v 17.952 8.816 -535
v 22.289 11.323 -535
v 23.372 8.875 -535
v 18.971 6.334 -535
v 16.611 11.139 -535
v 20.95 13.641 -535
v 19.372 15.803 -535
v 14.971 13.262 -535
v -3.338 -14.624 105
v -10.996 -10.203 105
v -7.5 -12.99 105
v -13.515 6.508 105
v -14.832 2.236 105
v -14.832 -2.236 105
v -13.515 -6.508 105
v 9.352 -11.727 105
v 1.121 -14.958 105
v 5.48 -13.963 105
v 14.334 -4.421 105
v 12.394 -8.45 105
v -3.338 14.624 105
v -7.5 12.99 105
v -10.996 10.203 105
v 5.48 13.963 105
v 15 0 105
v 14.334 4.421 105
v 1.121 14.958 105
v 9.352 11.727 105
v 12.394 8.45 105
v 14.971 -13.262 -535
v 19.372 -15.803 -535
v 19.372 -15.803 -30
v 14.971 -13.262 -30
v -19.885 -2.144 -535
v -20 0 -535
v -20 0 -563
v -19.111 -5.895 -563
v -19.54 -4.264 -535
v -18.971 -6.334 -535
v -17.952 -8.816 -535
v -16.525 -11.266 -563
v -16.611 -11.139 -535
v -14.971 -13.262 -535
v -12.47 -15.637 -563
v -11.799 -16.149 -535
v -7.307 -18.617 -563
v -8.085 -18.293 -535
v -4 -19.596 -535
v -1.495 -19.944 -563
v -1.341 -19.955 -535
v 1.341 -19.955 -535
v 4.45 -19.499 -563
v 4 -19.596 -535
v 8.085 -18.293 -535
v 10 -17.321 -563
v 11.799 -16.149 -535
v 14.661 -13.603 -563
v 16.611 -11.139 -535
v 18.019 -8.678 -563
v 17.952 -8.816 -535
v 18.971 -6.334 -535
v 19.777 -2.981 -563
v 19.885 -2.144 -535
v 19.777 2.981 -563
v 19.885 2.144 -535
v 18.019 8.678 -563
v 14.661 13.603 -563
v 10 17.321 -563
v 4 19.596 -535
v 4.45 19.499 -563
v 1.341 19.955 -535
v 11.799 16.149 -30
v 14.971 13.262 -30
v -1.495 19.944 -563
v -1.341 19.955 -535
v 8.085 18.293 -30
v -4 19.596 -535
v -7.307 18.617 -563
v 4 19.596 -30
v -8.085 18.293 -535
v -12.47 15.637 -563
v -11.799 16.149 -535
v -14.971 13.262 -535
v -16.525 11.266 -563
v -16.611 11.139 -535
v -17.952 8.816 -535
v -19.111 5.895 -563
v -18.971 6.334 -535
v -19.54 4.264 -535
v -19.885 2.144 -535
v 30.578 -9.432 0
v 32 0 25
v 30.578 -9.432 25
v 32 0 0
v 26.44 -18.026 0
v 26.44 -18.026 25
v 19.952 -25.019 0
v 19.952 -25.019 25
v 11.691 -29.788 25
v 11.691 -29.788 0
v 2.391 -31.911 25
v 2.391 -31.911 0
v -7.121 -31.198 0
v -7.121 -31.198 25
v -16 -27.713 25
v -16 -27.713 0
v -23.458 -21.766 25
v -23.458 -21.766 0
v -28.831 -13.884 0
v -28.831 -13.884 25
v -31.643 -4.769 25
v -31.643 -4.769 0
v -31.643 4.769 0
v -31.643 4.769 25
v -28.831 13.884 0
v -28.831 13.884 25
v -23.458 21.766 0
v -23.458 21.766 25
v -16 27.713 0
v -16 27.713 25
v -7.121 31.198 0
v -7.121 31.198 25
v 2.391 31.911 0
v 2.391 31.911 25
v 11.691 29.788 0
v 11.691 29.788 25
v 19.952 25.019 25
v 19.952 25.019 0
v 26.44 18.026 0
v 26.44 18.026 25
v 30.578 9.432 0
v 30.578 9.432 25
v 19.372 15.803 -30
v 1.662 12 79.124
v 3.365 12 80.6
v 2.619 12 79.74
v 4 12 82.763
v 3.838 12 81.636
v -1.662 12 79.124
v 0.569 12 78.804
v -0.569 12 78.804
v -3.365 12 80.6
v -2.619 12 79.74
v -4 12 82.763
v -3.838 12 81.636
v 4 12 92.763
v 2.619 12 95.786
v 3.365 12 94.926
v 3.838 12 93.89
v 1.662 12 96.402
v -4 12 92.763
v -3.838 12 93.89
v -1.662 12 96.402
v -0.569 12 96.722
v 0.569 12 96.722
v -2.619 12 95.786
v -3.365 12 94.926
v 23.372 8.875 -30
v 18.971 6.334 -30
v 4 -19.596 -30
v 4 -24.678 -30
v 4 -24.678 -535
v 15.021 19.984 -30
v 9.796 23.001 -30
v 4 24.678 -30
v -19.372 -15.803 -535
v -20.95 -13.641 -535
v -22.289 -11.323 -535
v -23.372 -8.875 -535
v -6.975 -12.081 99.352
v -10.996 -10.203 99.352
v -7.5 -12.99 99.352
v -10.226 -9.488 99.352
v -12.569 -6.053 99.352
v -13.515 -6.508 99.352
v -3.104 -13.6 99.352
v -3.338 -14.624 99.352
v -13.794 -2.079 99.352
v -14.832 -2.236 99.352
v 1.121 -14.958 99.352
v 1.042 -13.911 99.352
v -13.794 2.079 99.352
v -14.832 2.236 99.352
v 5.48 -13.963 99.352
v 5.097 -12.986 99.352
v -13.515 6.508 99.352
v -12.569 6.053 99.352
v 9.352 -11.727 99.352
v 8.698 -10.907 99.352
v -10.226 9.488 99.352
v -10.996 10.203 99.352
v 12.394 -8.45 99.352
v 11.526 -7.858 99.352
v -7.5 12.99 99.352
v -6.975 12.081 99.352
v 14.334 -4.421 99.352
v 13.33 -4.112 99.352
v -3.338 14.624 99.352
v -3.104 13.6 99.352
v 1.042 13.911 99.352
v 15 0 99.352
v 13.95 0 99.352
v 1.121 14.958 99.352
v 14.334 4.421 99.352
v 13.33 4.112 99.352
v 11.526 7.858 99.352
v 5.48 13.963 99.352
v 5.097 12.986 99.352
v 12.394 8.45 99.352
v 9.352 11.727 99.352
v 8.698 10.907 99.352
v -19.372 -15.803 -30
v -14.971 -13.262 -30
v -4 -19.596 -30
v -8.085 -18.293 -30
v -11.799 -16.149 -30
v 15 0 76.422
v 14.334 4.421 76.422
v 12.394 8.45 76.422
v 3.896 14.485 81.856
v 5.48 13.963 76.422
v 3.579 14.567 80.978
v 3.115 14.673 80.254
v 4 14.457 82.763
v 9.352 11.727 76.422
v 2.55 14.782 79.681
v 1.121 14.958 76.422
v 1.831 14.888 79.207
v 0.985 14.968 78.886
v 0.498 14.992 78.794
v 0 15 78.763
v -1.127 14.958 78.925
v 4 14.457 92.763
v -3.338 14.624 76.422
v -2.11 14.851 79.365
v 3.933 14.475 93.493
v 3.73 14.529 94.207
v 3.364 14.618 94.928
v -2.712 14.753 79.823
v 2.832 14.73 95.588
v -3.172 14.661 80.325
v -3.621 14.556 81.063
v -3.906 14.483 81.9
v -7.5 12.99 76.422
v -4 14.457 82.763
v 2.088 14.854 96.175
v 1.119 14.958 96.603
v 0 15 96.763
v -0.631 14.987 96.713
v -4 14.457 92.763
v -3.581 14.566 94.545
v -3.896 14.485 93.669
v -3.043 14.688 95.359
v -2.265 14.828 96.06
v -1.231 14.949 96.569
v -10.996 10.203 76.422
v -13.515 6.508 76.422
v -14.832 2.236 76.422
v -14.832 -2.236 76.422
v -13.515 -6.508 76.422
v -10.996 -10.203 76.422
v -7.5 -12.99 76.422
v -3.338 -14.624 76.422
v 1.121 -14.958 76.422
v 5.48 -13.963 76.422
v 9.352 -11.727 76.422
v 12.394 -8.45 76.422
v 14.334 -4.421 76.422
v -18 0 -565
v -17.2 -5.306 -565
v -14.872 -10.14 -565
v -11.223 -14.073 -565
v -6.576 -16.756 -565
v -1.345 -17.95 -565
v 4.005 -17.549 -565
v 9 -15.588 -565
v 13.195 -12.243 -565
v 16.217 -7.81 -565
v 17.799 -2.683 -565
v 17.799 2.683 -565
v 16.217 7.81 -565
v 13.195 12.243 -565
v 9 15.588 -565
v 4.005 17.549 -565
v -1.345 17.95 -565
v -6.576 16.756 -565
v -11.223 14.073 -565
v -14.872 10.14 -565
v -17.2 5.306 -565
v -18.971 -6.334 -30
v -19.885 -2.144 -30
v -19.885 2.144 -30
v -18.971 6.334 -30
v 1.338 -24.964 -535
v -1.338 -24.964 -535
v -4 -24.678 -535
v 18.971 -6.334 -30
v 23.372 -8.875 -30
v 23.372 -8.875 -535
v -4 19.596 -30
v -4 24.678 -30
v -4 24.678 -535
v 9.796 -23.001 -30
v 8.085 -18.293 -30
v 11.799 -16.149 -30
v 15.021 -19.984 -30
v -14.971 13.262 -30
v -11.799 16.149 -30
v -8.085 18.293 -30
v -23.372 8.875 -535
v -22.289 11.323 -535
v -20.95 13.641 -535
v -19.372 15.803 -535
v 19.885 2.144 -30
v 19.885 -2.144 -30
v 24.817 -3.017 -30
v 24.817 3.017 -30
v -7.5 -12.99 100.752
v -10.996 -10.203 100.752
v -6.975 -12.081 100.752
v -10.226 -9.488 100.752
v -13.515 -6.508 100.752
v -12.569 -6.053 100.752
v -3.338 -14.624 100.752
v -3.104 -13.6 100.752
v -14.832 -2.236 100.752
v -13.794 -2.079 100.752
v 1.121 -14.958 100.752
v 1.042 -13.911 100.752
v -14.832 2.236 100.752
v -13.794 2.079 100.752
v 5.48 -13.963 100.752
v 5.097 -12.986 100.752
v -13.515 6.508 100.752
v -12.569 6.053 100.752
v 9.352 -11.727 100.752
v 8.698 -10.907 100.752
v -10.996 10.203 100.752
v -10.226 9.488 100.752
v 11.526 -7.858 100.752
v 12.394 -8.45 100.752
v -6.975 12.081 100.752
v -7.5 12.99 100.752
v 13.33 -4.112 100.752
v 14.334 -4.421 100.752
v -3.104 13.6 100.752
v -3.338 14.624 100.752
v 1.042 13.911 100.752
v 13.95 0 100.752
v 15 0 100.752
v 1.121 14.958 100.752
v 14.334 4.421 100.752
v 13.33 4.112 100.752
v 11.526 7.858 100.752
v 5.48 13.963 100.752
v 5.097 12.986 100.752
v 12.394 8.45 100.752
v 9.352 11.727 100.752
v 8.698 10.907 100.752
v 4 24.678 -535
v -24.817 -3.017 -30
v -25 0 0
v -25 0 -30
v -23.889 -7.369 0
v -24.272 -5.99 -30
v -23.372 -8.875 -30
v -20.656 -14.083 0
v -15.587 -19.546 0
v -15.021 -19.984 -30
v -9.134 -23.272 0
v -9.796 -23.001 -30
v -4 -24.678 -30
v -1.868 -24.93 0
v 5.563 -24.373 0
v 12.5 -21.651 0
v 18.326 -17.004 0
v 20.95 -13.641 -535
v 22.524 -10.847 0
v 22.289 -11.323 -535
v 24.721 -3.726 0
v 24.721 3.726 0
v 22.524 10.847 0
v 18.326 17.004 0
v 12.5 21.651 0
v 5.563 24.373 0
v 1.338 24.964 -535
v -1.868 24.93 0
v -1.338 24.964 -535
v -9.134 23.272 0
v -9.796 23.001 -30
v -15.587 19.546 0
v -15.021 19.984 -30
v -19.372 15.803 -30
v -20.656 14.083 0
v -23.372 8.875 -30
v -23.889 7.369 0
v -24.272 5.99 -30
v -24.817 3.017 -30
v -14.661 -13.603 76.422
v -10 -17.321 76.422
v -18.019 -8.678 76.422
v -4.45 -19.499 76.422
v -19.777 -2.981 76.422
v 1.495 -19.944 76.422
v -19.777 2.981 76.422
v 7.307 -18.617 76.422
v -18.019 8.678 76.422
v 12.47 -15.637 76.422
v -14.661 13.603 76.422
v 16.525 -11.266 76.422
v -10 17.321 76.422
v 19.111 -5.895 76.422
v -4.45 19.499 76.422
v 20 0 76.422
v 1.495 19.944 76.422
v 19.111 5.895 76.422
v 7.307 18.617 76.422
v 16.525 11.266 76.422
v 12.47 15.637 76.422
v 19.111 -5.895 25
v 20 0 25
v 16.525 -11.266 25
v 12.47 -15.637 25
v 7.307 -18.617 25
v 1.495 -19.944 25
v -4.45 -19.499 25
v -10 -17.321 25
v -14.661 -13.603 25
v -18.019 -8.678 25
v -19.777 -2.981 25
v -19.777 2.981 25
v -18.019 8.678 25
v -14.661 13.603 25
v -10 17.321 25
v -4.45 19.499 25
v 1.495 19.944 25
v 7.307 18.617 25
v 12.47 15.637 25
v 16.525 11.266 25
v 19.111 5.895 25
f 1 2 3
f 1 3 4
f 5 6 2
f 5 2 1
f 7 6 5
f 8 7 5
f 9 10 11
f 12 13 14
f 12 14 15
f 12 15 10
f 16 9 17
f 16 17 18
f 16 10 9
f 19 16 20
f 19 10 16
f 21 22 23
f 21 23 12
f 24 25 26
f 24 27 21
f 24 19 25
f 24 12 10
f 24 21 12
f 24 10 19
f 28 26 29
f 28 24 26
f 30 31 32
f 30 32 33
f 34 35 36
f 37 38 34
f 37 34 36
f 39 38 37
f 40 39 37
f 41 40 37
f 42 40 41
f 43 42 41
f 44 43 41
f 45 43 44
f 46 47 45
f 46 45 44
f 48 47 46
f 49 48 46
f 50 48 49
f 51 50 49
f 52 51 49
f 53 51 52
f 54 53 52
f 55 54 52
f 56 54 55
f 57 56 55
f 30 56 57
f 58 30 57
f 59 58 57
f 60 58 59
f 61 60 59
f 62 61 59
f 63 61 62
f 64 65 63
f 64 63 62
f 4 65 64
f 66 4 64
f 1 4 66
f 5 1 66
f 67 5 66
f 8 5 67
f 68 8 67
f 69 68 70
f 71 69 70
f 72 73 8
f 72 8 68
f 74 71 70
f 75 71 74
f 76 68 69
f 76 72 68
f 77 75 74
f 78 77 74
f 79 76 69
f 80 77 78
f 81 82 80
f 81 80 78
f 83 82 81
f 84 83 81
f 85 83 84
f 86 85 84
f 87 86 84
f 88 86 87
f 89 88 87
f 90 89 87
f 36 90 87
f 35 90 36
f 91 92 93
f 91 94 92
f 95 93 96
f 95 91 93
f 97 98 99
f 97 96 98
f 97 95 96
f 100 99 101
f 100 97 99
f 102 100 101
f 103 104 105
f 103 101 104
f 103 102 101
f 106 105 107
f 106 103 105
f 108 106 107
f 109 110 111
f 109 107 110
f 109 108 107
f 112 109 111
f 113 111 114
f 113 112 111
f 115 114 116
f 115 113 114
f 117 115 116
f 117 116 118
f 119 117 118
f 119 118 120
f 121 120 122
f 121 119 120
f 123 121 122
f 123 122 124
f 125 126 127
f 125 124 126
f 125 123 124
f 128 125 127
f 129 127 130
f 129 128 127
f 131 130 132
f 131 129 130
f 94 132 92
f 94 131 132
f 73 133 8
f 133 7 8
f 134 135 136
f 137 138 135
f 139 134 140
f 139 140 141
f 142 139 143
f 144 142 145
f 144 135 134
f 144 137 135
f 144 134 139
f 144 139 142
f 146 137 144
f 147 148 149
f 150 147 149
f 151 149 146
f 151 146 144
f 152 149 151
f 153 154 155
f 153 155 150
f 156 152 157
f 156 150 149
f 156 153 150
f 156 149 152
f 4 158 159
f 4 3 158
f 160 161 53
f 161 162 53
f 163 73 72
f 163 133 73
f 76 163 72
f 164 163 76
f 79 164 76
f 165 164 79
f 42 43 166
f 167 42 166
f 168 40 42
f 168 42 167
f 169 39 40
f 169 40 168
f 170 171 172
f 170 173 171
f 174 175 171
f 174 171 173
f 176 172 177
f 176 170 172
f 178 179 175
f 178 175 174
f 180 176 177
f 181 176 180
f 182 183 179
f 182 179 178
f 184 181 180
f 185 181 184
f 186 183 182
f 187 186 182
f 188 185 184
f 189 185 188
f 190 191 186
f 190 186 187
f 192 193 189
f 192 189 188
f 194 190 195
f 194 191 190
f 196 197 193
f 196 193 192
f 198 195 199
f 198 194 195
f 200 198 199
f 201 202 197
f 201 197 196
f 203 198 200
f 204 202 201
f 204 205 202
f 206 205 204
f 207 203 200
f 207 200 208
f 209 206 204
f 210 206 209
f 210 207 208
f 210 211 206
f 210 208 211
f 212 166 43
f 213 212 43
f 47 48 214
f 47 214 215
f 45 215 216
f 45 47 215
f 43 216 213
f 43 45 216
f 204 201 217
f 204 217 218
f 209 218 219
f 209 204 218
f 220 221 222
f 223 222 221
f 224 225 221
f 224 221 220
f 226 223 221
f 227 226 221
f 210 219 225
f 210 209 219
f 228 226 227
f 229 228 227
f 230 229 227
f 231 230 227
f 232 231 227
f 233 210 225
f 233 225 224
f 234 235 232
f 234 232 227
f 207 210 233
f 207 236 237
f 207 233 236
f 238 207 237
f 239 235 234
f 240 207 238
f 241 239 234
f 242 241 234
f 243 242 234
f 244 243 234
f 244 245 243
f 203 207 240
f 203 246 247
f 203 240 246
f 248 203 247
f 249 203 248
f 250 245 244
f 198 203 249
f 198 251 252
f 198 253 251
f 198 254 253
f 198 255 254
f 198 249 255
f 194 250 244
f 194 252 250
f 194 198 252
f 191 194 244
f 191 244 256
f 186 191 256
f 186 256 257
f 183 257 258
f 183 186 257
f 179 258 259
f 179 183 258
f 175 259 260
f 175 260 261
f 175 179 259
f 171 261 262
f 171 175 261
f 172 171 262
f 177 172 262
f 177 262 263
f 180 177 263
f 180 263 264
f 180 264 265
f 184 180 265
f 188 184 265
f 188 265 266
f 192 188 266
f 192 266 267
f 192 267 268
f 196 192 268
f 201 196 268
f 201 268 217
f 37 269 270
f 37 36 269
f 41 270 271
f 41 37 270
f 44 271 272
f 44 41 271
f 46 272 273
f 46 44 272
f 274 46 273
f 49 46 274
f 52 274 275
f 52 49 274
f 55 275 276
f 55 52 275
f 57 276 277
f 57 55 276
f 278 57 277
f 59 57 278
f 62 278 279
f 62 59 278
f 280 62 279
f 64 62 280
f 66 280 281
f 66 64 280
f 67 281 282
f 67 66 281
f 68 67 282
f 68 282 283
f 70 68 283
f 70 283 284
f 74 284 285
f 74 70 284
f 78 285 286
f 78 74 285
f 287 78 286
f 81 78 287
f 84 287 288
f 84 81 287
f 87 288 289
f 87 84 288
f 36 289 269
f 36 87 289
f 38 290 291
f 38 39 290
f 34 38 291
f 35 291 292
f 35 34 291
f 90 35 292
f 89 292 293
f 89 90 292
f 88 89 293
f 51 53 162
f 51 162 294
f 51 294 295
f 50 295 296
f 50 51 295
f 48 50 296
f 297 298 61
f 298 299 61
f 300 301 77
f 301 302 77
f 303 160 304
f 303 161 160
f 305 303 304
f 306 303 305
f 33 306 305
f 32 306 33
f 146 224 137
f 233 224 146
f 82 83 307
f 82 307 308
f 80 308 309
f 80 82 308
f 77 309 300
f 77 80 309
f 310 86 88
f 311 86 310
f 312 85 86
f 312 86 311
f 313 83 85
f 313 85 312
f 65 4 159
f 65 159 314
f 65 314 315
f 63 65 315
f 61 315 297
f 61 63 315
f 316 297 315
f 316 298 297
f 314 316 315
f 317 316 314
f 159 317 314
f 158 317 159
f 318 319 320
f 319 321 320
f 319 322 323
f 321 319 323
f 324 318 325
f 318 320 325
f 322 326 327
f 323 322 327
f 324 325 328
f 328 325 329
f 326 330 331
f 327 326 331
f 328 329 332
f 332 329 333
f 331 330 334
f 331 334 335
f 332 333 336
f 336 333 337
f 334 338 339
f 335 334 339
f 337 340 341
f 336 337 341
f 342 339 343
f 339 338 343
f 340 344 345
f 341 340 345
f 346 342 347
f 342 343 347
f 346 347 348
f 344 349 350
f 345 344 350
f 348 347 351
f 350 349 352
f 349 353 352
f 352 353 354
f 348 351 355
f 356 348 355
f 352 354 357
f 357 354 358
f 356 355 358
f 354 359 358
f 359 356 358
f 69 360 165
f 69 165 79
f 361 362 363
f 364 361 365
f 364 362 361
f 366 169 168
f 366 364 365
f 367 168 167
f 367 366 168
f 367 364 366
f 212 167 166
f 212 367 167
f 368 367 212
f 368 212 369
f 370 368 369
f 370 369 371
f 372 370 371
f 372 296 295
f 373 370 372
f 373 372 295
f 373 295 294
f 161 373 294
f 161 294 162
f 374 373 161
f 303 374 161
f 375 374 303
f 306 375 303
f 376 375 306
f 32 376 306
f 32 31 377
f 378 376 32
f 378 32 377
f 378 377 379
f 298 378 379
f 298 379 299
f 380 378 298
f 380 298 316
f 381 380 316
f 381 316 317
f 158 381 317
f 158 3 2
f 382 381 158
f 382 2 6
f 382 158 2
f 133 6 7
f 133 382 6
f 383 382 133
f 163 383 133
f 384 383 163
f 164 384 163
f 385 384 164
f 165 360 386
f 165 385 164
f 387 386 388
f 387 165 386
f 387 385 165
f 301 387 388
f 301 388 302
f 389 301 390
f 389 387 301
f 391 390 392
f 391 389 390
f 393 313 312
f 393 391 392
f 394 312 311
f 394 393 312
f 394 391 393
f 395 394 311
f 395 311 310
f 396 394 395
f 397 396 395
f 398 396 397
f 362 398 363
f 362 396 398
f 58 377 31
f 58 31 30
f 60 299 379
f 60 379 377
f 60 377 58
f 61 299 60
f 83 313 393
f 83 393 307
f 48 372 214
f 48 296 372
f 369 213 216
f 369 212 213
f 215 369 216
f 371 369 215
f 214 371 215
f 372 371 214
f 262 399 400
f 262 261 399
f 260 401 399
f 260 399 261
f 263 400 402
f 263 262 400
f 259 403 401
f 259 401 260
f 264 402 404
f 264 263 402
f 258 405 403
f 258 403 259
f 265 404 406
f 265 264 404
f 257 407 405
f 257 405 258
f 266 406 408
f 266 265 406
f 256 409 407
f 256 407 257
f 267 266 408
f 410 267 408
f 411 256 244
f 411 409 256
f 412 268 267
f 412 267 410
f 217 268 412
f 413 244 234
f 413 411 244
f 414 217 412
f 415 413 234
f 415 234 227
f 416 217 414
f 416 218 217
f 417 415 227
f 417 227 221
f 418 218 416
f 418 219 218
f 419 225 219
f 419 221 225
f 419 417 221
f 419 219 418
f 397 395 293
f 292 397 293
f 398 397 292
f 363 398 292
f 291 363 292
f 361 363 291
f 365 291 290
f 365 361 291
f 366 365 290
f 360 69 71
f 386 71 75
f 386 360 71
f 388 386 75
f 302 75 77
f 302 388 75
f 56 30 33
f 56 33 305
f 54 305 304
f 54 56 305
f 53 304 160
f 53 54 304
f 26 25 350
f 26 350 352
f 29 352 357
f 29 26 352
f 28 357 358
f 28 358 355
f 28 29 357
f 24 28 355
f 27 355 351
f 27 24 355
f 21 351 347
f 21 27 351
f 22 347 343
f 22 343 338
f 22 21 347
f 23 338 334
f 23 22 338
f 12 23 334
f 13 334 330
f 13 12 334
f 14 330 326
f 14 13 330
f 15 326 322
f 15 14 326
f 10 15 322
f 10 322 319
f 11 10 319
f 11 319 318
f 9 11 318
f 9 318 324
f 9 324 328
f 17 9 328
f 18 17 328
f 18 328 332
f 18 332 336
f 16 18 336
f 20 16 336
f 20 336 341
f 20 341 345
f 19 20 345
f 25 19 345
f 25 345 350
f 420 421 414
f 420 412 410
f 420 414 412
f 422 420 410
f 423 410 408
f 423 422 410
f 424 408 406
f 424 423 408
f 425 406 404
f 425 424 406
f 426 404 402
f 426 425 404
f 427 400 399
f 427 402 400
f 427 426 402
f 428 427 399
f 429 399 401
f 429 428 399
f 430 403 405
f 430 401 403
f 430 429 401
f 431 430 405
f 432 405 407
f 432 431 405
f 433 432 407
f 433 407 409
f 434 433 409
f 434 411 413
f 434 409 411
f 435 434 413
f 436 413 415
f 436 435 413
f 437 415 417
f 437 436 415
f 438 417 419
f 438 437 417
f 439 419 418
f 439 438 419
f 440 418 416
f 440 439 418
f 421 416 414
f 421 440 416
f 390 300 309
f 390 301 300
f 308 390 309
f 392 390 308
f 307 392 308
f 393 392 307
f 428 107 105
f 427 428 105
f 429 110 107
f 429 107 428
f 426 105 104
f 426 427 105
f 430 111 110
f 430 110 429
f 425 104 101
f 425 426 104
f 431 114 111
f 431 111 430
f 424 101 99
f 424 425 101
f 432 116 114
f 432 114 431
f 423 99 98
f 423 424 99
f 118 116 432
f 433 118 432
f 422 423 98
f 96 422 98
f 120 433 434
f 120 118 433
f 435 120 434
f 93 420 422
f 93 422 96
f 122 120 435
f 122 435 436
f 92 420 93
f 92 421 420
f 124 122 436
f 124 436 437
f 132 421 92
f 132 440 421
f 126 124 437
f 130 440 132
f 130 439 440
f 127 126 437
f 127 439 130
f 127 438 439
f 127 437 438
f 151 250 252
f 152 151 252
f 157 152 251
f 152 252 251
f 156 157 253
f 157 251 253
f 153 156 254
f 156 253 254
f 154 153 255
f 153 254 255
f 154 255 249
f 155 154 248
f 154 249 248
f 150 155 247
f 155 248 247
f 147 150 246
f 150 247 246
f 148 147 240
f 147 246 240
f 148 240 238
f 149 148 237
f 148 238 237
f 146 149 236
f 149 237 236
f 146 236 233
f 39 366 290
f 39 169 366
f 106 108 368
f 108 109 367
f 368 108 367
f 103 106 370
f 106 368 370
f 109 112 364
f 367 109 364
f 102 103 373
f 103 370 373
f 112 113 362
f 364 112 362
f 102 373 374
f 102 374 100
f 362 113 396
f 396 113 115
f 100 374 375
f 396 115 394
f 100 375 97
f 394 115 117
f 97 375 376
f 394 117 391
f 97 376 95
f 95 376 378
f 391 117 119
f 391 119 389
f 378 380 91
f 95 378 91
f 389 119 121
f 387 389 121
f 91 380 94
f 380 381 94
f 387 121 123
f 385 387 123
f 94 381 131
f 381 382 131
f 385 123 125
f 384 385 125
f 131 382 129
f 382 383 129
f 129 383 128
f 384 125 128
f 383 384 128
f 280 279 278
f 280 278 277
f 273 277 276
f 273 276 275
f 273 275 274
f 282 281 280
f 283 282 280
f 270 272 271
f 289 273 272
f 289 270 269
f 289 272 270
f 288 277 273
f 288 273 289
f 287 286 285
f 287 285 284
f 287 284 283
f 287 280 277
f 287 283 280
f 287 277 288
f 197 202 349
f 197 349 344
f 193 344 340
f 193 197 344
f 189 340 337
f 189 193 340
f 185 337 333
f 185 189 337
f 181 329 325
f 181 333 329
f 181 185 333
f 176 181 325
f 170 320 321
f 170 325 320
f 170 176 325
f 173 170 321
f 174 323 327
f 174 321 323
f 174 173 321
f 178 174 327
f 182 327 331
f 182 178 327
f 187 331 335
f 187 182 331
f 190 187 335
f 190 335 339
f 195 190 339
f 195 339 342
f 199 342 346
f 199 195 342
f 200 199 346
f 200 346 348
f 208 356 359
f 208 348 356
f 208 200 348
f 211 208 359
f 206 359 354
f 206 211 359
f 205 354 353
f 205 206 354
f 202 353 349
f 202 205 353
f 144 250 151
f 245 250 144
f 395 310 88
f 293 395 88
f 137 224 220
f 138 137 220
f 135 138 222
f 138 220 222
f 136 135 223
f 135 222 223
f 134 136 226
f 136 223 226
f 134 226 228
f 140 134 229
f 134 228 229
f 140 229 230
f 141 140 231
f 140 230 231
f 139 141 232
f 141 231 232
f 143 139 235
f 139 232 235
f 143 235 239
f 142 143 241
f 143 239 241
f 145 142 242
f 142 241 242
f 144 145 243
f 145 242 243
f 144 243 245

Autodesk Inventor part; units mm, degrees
ref_plane "YZ Plane" through (0, 0, 0) normal (1, 0, 0) x (0, 1, 0)
ref_plane "XY Plane" through (0, 0, 0) normal (0, 0, 1) x (1, 0, 0)
sketch "草图1" plane through (0, 0, 0) normal (0, 0, 1) x (1, 0, 0)
  circle A0 centre (0, 0) radius 32
  dimension "d0" = 64
extrude "拉伸1" add sketch "草图1" along normal blind 25
sketch "草图2" plane through (0, 0, 25) normal (0, 0, 1) x (1, 0, 0)
  circle A0 centre (0, 0) radius 20
  dimension "d3" = 40
extrude "拉伸2" add sketch "草图2" along normal blind 80
sketch "草图3" plane through (0, 0, 0) normal (0, 0, -1) x (-1, 0, 0)
  circle A0 centre (0, 0) radius 25
  dimension "d6" = 50
extrude "拉伸3" add sketch "草图3" along normal blind 535
sketch "草图4" plane through (0, 0, -535) normal (0, 0, -1) x (-1, 0, 0)
  circle A0 centre (0, 0) radius 20
  dimension "d9" = 40
extrude "拉伸4" add sketch "草图4" along normal blind 30
chamfer "倒角1" distance 2 angle 45 1 edges at (20, 0, -565)
sketch "草图5" plane through (0, 0, -535) normal (0, 0, -1) x (-1, 0, 0)
  circle A0 centre (0, 0) radius 25
  circle A1 centre (0, 0) radius 20
  line L0 (-4, 24.6779) -> (-4, 19.5959)
  line L1 (4, 24.6779) -> (4, 19.5959)
  circle A2 centre (0, 0) radius 20 projected
  circle A3 centre (0, 0) radius 25 projected
  line L2 (0, 0) -> (0, 7.2531)
  line L3 (-19.3717, 15.8031) -> (-14.9706, 13.2621)
  line L4 (-23.3717, -8.8749) -> (-18.9706, -6.3339)
  line L5 (-4, -24.6779) -> (-4, -19.5959)
  line L6 (19.3717, -15.8031) -> (14.9706, -13.2621)
  line L7 (23.3717, 8.8749) -> (18.9706, 6.3339)
  line L8 (-14.9706, 13.2621) -> (-19.3717, 15.8031)
  arc A4 (-4, 24.6779) -> (-19.3717, 15.8031) centre (0, 0) ccw
  arc A5 (-4, 19.5959) -> (-14.9706, 13.2621) centre (0, 0) ccw
  dimension "d15" = 50
  dimension "d16" = 40
  dimension "d17" = 7.2531
  dimension "d18" = 4
  dimension "d19" = 8
  dimension "d22" = 360
extrude "拉伸5" cut sketch "草图5" against normal blind 505 contours L0 A1 L3 A0
pattern_circular "环形阵列1" count 6 over 360 about axis through (0, 0, -10) along (0, 0, 1) of "拉伸5"
sketch "草图6" plane through (0, 0, 105) normal (0, 0, 1) x (1, 0, 0)
  circle A0 centre (0, 0) radius 15
  circle A1 centre (0, 0) radius 20
  dimension "d29" = 30
  dimension "d30" = 40
extrude "拉伸6" cut sketch "草图6" against normal blind 28.578
sketch "草图7" plane through (0, 0, 0) normal (0, 1, 0) x (-1, 0, 0)
  line L0 (-13.95, 99.352) -> (-18.95, 99.352)
  line L1 (-18.95, 99.352) -> (-18.95, 100.752)
  line L2 (-18.95, 100.752) -> (-13.95, 100.752)
  line L3 (-13.95, 100.752) -> (-13.95, 99.352)
  line L4 (0, 0) -> (0, 169.8002)
  line L5 (15, 105) -> (-15, 105) projected
  line L6 (0, -711.96) -> (0, 316.7602) projected
  dimension "d33" = 169.8002
  dimension "d34" = 13.95
  dimension "d35" = 4.248
  dimension "d36" = 1.4
  dimension "d37" = 5
revolve "旋转1" cut sketch "草图7" angle 360 about axis through (0, 0, -10) along (0, 0, 1)
ref_plane "工作平面1" through (0, 15, 105) normal (0, 1, 0) x (-1, 0, 0)
sketch "草图8" plane through (0, 15, 105) normal (0, 1, 0) x (-1, 0, 0)
  line L0 (4, -22.237) -> (-4, -22.237)
  line L1 (-4, -22.237) -> (-4, -12.237)
  line L2 (-4, -12.237) -> (4, -12.237)
  line L3 (4, -12.237) -> (4, -22.237)
  arc A0 (-4, -22.237) -> (4, -22.237) centre (0, -22.237) ccw
  arc A1 (4, -12.237) -> (-4, -12.237) centre (0, -12.237) ccw
  line L4 (-15, -5.648) -> (15, -5.648) projected
  line L5 (15, 0) -> (-15, 0) projected
  line L6 (0, 0) -> (0, 18.2304)
  point P0 (0, -105)
  dimension "d39" = 8
  dimension "d40" = 10
  dimension "d41" = 6.589
  dimension "d42" = 18.2304
extrude "拉伸7" cut sketch "草图8" against normal blind 3
properties part number "主动轴"
